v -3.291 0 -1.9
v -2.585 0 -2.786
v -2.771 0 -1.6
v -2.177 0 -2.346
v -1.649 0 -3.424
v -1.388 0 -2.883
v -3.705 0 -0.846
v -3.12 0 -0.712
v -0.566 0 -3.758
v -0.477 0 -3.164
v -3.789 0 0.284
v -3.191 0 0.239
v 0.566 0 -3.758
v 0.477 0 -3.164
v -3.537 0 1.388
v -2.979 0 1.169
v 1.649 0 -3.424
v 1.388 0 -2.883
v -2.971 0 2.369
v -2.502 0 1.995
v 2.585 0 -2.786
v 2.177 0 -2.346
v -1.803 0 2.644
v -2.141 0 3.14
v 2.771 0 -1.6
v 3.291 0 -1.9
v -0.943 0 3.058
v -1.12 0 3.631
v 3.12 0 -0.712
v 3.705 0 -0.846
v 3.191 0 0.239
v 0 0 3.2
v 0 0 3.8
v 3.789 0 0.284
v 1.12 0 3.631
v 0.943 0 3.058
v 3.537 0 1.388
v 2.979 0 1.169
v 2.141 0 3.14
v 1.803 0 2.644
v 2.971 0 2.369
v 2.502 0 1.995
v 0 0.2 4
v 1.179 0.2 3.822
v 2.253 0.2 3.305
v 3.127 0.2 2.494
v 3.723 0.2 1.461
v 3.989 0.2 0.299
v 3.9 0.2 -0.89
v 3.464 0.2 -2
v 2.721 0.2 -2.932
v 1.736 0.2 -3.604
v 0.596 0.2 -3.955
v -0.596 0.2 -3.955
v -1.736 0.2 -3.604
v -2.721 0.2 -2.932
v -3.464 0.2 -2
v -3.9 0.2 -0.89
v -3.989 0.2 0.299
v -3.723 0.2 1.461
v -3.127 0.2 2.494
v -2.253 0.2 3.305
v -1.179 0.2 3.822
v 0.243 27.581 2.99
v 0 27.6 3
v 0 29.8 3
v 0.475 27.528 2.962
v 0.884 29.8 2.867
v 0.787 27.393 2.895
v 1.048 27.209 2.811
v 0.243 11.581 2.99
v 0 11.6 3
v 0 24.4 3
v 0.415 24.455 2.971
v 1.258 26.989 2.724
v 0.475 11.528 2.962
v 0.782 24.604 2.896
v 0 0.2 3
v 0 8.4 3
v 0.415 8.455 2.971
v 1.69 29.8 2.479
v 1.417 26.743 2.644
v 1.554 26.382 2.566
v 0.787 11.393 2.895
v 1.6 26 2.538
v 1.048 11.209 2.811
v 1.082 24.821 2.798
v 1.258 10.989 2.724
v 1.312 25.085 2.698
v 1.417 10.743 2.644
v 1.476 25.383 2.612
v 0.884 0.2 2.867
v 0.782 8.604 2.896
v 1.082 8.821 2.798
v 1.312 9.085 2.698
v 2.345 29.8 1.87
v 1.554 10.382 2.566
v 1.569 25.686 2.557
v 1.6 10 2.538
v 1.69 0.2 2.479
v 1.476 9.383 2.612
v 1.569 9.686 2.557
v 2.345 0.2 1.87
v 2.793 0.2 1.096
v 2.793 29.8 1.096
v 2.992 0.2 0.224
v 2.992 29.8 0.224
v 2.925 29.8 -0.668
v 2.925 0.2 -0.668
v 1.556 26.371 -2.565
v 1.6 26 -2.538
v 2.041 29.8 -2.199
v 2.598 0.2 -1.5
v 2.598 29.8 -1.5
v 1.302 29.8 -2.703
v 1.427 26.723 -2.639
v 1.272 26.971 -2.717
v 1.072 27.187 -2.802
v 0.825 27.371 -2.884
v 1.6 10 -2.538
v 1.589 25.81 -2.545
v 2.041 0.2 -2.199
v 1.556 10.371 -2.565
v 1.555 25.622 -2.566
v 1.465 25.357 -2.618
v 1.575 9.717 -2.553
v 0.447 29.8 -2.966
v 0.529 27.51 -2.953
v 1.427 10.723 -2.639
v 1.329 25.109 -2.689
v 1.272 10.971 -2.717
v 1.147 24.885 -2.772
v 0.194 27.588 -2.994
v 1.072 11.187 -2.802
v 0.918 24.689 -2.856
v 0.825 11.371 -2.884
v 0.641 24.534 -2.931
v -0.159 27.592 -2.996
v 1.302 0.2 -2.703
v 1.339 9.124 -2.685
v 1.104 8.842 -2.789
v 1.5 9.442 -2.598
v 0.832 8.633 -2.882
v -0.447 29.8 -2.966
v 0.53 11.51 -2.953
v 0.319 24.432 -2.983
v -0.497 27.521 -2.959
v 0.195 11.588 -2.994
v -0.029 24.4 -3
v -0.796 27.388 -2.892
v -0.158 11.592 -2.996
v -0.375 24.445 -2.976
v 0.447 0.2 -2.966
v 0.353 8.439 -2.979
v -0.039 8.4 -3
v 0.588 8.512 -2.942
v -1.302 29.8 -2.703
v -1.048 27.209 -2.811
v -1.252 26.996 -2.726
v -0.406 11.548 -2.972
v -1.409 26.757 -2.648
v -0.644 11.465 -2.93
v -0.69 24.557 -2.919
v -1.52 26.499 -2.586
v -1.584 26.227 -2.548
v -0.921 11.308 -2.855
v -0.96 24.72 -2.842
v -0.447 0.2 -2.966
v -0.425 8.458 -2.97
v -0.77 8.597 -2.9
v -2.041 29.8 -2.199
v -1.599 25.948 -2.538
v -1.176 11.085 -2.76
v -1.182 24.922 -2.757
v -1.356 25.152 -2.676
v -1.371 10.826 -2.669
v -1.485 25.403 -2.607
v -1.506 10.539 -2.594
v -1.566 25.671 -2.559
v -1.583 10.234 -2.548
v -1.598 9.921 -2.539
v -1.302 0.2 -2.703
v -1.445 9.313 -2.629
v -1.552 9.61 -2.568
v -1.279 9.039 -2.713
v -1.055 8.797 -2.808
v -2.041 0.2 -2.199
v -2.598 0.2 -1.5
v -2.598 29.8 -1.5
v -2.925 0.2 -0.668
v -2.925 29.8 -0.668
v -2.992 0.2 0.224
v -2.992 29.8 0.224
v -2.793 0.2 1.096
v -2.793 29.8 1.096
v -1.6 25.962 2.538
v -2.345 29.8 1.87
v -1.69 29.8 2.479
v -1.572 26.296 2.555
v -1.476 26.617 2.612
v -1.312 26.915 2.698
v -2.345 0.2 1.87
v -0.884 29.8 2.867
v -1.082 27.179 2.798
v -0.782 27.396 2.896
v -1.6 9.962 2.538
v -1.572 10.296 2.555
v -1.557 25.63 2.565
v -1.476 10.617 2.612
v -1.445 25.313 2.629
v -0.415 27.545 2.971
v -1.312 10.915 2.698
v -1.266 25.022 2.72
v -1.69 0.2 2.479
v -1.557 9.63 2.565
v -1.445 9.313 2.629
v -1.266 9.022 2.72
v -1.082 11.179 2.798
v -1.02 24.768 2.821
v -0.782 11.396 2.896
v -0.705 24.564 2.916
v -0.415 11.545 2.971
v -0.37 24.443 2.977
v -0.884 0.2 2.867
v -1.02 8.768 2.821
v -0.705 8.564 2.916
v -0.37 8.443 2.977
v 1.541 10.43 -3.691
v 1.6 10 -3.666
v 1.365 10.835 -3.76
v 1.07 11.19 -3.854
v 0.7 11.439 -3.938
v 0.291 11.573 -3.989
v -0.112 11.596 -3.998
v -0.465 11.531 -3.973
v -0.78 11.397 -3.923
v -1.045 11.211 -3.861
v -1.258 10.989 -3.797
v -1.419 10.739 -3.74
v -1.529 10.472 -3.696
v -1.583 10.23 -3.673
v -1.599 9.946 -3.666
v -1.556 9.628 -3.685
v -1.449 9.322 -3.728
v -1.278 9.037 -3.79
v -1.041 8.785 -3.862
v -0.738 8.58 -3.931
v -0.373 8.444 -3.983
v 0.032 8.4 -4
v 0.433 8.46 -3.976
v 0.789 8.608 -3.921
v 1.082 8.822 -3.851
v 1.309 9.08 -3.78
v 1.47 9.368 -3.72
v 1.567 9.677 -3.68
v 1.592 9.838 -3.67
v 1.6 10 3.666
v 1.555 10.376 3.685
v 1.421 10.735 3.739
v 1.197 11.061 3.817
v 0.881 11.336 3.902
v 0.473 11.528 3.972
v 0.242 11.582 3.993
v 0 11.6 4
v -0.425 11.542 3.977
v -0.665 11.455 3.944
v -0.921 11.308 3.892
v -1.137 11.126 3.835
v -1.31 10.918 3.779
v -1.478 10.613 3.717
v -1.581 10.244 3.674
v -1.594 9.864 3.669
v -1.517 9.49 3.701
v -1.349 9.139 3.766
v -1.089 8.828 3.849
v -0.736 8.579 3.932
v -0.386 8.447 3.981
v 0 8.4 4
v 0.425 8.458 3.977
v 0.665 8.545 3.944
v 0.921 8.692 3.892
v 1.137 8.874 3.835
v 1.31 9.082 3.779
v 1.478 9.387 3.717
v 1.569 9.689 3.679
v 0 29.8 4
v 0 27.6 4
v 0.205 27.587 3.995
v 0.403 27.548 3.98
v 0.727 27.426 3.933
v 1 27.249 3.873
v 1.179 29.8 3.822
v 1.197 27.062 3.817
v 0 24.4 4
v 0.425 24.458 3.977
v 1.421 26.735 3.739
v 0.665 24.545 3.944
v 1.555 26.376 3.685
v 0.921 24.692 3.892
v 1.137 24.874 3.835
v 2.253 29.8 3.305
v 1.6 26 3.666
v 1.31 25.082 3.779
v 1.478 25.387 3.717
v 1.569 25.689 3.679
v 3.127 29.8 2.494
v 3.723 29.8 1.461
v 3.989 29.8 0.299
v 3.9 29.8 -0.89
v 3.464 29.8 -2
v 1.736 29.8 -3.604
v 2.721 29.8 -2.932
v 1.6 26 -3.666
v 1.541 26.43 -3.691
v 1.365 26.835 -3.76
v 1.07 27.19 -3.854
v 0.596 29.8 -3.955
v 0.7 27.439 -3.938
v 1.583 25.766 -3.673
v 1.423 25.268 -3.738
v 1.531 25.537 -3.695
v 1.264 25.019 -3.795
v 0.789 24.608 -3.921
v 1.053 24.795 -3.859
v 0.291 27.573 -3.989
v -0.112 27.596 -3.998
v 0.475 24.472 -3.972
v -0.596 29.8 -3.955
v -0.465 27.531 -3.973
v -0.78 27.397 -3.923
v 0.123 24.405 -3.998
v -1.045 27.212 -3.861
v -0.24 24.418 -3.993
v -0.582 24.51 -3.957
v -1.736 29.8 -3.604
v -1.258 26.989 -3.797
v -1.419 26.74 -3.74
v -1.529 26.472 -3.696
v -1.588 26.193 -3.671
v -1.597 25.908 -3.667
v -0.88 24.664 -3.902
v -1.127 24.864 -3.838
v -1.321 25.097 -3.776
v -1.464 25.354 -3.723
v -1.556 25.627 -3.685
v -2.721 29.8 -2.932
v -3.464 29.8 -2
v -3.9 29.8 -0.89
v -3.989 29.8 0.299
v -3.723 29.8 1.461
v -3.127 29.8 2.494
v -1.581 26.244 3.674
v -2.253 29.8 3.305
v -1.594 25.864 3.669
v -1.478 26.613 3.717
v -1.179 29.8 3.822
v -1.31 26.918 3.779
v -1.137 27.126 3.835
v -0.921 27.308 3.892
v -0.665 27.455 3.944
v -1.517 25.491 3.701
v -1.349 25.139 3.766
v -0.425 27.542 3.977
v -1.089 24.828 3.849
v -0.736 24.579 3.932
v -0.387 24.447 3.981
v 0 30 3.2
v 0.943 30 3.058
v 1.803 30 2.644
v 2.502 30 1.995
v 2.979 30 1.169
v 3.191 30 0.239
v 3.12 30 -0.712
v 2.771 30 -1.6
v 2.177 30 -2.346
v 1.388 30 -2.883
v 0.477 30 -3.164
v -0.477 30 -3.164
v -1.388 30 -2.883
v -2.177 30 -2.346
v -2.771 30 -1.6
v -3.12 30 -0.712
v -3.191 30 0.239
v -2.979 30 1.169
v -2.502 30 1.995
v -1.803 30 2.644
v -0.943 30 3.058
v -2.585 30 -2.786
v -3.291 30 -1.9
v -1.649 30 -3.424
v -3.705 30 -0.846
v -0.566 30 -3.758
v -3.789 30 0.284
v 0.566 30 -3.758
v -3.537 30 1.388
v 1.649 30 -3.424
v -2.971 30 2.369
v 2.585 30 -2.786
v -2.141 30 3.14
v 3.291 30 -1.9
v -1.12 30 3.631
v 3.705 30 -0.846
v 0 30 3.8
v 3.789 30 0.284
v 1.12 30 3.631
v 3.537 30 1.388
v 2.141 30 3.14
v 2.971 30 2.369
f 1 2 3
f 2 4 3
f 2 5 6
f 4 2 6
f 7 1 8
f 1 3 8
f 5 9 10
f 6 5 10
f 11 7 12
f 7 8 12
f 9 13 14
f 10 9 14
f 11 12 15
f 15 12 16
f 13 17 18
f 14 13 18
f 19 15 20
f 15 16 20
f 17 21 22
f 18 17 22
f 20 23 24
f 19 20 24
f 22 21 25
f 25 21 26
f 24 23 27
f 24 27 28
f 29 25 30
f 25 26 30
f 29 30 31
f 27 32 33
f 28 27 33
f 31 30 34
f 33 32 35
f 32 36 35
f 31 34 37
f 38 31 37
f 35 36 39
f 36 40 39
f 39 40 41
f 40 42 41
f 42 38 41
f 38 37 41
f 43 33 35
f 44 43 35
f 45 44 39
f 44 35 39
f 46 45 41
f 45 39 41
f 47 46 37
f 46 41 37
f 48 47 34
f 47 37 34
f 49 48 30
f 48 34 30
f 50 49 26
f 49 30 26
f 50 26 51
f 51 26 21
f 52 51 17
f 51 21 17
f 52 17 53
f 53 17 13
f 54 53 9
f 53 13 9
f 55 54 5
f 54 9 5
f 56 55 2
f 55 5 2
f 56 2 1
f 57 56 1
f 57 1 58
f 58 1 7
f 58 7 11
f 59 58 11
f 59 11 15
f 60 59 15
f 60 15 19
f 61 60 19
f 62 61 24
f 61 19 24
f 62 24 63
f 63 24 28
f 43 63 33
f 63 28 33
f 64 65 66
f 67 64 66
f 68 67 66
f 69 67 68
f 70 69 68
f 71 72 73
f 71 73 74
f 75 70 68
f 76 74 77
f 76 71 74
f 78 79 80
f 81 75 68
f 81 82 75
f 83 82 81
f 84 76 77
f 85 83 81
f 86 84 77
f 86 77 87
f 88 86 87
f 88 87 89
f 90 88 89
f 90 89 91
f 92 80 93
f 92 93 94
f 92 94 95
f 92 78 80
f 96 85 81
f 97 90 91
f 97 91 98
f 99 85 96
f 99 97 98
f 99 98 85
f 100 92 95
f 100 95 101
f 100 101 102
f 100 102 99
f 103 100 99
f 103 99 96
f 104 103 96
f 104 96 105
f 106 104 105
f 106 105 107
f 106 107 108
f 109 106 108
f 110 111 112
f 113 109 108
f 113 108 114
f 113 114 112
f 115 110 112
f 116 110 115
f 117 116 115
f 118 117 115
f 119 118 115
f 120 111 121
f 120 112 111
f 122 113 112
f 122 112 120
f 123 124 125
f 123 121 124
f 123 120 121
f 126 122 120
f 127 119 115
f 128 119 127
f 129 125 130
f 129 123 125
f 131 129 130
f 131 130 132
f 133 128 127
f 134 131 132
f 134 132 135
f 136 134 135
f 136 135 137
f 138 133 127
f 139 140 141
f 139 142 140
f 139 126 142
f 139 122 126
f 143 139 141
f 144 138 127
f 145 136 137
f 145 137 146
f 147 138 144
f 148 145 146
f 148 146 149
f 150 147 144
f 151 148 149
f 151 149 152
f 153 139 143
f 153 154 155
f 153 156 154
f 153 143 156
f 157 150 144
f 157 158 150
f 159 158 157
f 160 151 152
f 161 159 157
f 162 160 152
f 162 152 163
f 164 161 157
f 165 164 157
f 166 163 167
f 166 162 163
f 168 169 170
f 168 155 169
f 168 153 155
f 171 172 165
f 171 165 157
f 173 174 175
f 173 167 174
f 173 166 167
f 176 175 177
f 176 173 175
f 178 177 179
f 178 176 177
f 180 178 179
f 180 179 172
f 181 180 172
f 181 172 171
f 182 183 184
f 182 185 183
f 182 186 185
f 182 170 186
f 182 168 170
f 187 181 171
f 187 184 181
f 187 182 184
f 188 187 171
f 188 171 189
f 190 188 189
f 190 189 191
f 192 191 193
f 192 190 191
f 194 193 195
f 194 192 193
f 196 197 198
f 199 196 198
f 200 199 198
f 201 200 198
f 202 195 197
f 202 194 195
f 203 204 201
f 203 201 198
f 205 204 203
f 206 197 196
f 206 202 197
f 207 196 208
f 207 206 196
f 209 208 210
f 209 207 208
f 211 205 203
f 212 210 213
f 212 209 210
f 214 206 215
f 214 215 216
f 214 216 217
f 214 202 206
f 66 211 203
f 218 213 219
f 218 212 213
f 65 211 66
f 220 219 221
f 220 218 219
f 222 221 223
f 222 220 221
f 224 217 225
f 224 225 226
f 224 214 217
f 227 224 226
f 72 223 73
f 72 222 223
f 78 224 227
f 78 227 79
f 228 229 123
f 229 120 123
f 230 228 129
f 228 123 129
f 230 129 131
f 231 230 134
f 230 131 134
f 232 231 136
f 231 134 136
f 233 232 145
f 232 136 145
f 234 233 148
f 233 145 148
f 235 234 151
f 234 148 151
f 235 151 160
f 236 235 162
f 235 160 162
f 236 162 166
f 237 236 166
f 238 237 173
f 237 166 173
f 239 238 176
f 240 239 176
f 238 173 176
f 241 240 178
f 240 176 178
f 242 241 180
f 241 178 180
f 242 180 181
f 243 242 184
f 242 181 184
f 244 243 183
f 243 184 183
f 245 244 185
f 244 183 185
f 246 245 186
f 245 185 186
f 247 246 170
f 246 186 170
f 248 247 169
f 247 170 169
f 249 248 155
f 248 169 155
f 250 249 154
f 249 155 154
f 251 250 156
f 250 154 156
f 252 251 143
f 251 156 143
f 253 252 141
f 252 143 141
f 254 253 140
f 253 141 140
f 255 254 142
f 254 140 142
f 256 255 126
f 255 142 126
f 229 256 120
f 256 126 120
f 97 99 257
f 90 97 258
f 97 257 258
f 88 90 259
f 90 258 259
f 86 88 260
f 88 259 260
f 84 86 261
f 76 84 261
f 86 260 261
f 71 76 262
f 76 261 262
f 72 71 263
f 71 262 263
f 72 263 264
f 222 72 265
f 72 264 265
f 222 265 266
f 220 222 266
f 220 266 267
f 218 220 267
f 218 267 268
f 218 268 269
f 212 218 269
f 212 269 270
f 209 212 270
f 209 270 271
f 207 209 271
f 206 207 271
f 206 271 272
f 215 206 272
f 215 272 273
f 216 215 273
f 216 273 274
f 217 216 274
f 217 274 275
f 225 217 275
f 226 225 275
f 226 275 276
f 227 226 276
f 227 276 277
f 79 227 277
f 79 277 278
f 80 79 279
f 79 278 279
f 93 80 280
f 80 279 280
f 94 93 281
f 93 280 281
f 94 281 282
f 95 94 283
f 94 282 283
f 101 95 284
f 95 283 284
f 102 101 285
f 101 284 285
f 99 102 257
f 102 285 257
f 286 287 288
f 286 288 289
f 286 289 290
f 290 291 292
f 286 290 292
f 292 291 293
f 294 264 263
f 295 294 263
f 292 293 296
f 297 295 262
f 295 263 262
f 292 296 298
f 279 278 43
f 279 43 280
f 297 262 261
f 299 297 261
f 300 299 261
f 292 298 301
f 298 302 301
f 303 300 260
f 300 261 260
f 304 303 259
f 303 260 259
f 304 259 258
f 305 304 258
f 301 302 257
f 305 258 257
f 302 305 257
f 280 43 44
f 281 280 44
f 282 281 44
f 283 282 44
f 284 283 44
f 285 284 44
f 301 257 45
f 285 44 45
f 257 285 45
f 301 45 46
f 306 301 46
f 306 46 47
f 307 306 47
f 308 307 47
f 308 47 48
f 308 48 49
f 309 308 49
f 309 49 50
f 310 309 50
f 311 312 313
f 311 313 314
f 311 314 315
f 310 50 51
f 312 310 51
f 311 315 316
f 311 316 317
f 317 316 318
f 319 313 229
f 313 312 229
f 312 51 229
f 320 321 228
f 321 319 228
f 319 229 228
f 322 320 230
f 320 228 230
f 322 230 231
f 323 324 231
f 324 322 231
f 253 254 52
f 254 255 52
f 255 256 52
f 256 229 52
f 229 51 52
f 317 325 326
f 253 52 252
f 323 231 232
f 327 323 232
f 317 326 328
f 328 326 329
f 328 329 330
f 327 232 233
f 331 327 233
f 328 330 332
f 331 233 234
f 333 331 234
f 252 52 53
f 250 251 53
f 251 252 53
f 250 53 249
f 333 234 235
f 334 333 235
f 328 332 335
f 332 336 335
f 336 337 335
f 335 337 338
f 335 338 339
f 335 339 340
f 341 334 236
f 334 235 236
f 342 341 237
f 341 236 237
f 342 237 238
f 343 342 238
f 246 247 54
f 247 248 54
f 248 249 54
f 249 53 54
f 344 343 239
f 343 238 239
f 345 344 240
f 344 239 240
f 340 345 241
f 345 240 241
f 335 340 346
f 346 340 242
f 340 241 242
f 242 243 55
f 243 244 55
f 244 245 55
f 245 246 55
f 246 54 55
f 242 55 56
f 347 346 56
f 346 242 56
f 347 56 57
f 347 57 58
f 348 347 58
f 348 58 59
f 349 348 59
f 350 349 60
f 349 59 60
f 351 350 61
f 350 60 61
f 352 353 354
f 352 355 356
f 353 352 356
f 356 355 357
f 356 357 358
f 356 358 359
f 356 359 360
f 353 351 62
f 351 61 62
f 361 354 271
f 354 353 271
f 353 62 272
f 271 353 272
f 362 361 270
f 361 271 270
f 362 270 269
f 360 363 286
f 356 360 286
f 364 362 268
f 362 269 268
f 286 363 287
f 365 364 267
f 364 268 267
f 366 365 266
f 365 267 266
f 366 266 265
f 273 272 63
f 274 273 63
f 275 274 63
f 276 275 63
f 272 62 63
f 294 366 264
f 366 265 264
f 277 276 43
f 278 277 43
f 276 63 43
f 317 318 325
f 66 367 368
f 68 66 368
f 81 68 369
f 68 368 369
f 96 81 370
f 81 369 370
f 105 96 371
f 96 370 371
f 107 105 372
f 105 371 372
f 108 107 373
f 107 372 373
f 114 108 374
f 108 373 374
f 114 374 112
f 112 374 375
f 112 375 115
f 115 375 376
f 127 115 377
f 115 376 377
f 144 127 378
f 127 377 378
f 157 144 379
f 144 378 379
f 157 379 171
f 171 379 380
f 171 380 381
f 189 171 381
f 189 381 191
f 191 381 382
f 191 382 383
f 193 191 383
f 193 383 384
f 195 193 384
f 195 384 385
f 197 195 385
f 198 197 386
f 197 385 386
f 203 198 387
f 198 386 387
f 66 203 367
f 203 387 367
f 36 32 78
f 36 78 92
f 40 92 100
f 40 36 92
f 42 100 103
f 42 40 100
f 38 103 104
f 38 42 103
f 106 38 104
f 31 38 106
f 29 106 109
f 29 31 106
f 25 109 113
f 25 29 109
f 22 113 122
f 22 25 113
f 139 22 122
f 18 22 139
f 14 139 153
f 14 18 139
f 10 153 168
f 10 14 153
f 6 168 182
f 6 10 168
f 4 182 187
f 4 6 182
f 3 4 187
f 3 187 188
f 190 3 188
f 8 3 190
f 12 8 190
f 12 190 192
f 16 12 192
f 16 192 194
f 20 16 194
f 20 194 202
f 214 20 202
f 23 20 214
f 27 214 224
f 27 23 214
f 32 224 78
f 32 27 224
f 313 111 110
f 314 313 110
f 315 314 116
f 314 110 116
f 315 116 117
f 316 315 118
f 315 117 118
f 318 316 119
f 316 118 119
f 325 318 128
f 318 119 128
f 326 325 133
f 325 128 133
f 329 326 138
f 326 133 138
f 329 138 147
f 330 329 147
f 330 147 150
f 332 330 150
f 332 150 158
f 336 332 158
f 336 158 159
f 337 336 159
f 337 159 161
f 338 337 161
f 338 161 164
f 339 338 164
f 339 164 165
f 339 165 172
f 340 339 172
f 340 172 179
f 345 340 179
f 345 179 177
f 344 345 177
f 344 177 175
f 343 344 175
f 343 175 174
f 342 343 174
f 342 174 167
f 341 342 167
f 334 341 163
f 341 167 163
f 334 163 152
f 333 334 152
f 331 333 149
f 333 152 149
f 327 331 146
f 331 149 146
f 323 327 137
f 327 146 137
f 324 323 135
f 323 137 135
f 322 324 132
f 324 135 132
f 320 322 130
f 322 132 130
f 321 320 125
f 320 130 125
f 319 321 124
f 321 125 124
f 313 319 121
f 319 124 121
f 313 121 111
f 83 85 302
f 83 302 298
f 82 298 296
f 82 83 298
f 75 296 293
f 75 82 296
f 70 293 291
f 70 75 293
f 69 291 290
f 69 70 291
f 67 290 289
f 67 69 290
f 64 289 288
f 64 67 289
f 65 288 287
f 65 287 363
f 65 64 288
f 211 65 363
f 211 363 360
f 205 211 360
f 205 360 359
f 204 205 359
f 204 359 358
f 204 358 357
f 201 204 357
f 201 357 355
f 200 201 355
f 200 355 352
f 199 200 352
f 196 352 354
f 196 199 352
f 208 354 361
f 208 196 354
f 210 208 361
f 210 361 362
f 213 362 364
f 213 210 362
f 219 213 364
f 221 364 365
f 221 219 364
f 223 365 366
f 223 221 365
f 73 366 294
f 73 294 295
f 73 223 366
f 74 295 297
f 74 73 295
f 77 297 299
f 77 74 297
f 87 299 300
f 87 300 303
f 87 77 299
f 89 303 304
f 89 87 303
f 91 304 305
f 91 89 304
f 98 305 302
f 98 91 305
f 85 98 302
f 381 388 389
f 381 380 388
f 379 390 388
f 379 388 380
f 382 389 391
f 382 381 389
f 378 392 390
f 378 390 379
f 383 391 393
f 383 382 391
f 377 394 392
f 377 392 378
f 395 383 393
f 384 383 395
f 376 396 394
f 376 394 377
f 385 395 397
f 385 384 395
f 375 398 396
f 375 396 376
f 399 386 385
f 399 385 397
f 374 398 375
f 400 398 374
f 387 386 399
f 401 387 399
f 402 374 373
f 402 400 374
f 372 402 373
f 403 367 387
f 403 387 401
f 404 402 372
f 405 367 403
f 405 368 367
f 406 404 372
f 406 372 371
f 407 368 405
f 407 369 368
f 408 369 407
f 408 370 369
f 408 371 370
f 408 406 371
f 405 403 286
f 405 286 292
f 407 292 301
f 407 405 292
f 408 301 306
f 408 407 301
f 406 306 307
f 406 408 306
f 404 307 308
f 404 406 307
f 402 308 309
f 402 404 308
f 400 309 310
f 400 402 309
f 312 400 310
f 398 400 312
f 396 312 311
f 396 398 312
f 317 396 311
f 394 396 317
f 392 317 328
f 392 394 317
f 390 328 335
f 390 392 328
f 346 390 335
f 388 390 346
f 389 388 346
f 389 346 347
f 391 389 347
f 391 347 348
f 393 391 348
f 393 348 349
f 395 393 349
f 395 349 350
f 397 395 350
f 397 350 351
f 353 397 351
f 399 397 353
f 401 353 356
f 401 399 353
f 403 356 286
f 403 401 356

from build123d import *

# Parameters (mm, degrees)
SKIZZE1_R                       = 4
SKIZZE1_R_2                     = 3
AUFSATZ_LINEAR_AUSTRAGEN1_DEPTH = 30
FASE1_SIZE                      = 0.2
SKIZZE2_R                       = 1.6
SCHNITT_LINEAR_AUSTRAGEN1_DEPTH = 6


with BuildPart() as part:
    # Skizze1 → Aufsatz-Linear austragen1 (new body)
    with BuildSketch(Plane(origin=(0, 0, 0), x_dir=(1, 0, 0), z_dir=(0, 1, 0))):
        with Locations(Location((0, 0, 0), (0, 0, 270))):
            Circle(SKIZZE1_R)
        with Locations(Location((0, 0, 0), (0, 0, 270))):
            Circle(SKIZZE1_R_2, mode=Mode.SUBTRACT)
    extrude(amount=AUFSATZ_LINEAR_AUSTRAGEN1_DEPTH)

    # Fase1
    fase1_edges = [part.edges().sort_by_distance(p)[0] for p in [
        (0, 0, -4),
        (0, 30, -4),
        (0, 0, -3),
        (0, 30, -3),
    ]]
    chamfer(fase1_edges, length=FASE1_SIZE)

    # Skizze2 → Schnitt-Linear austragen1 (cut, symmetric)
    with BuildSketch(Plane.XY):
        with Locations((0, 26)):
            Circle(SKIZZE2_R)
        with Locations((0, 10)):
            Circle(SKIZZE2_R)
    extrude(amount=SCHNITT_LINEAR_AUSTRAGEN1_DEPTH, both=True, mode=Mode.SUBTRACT)


solid = part.part
